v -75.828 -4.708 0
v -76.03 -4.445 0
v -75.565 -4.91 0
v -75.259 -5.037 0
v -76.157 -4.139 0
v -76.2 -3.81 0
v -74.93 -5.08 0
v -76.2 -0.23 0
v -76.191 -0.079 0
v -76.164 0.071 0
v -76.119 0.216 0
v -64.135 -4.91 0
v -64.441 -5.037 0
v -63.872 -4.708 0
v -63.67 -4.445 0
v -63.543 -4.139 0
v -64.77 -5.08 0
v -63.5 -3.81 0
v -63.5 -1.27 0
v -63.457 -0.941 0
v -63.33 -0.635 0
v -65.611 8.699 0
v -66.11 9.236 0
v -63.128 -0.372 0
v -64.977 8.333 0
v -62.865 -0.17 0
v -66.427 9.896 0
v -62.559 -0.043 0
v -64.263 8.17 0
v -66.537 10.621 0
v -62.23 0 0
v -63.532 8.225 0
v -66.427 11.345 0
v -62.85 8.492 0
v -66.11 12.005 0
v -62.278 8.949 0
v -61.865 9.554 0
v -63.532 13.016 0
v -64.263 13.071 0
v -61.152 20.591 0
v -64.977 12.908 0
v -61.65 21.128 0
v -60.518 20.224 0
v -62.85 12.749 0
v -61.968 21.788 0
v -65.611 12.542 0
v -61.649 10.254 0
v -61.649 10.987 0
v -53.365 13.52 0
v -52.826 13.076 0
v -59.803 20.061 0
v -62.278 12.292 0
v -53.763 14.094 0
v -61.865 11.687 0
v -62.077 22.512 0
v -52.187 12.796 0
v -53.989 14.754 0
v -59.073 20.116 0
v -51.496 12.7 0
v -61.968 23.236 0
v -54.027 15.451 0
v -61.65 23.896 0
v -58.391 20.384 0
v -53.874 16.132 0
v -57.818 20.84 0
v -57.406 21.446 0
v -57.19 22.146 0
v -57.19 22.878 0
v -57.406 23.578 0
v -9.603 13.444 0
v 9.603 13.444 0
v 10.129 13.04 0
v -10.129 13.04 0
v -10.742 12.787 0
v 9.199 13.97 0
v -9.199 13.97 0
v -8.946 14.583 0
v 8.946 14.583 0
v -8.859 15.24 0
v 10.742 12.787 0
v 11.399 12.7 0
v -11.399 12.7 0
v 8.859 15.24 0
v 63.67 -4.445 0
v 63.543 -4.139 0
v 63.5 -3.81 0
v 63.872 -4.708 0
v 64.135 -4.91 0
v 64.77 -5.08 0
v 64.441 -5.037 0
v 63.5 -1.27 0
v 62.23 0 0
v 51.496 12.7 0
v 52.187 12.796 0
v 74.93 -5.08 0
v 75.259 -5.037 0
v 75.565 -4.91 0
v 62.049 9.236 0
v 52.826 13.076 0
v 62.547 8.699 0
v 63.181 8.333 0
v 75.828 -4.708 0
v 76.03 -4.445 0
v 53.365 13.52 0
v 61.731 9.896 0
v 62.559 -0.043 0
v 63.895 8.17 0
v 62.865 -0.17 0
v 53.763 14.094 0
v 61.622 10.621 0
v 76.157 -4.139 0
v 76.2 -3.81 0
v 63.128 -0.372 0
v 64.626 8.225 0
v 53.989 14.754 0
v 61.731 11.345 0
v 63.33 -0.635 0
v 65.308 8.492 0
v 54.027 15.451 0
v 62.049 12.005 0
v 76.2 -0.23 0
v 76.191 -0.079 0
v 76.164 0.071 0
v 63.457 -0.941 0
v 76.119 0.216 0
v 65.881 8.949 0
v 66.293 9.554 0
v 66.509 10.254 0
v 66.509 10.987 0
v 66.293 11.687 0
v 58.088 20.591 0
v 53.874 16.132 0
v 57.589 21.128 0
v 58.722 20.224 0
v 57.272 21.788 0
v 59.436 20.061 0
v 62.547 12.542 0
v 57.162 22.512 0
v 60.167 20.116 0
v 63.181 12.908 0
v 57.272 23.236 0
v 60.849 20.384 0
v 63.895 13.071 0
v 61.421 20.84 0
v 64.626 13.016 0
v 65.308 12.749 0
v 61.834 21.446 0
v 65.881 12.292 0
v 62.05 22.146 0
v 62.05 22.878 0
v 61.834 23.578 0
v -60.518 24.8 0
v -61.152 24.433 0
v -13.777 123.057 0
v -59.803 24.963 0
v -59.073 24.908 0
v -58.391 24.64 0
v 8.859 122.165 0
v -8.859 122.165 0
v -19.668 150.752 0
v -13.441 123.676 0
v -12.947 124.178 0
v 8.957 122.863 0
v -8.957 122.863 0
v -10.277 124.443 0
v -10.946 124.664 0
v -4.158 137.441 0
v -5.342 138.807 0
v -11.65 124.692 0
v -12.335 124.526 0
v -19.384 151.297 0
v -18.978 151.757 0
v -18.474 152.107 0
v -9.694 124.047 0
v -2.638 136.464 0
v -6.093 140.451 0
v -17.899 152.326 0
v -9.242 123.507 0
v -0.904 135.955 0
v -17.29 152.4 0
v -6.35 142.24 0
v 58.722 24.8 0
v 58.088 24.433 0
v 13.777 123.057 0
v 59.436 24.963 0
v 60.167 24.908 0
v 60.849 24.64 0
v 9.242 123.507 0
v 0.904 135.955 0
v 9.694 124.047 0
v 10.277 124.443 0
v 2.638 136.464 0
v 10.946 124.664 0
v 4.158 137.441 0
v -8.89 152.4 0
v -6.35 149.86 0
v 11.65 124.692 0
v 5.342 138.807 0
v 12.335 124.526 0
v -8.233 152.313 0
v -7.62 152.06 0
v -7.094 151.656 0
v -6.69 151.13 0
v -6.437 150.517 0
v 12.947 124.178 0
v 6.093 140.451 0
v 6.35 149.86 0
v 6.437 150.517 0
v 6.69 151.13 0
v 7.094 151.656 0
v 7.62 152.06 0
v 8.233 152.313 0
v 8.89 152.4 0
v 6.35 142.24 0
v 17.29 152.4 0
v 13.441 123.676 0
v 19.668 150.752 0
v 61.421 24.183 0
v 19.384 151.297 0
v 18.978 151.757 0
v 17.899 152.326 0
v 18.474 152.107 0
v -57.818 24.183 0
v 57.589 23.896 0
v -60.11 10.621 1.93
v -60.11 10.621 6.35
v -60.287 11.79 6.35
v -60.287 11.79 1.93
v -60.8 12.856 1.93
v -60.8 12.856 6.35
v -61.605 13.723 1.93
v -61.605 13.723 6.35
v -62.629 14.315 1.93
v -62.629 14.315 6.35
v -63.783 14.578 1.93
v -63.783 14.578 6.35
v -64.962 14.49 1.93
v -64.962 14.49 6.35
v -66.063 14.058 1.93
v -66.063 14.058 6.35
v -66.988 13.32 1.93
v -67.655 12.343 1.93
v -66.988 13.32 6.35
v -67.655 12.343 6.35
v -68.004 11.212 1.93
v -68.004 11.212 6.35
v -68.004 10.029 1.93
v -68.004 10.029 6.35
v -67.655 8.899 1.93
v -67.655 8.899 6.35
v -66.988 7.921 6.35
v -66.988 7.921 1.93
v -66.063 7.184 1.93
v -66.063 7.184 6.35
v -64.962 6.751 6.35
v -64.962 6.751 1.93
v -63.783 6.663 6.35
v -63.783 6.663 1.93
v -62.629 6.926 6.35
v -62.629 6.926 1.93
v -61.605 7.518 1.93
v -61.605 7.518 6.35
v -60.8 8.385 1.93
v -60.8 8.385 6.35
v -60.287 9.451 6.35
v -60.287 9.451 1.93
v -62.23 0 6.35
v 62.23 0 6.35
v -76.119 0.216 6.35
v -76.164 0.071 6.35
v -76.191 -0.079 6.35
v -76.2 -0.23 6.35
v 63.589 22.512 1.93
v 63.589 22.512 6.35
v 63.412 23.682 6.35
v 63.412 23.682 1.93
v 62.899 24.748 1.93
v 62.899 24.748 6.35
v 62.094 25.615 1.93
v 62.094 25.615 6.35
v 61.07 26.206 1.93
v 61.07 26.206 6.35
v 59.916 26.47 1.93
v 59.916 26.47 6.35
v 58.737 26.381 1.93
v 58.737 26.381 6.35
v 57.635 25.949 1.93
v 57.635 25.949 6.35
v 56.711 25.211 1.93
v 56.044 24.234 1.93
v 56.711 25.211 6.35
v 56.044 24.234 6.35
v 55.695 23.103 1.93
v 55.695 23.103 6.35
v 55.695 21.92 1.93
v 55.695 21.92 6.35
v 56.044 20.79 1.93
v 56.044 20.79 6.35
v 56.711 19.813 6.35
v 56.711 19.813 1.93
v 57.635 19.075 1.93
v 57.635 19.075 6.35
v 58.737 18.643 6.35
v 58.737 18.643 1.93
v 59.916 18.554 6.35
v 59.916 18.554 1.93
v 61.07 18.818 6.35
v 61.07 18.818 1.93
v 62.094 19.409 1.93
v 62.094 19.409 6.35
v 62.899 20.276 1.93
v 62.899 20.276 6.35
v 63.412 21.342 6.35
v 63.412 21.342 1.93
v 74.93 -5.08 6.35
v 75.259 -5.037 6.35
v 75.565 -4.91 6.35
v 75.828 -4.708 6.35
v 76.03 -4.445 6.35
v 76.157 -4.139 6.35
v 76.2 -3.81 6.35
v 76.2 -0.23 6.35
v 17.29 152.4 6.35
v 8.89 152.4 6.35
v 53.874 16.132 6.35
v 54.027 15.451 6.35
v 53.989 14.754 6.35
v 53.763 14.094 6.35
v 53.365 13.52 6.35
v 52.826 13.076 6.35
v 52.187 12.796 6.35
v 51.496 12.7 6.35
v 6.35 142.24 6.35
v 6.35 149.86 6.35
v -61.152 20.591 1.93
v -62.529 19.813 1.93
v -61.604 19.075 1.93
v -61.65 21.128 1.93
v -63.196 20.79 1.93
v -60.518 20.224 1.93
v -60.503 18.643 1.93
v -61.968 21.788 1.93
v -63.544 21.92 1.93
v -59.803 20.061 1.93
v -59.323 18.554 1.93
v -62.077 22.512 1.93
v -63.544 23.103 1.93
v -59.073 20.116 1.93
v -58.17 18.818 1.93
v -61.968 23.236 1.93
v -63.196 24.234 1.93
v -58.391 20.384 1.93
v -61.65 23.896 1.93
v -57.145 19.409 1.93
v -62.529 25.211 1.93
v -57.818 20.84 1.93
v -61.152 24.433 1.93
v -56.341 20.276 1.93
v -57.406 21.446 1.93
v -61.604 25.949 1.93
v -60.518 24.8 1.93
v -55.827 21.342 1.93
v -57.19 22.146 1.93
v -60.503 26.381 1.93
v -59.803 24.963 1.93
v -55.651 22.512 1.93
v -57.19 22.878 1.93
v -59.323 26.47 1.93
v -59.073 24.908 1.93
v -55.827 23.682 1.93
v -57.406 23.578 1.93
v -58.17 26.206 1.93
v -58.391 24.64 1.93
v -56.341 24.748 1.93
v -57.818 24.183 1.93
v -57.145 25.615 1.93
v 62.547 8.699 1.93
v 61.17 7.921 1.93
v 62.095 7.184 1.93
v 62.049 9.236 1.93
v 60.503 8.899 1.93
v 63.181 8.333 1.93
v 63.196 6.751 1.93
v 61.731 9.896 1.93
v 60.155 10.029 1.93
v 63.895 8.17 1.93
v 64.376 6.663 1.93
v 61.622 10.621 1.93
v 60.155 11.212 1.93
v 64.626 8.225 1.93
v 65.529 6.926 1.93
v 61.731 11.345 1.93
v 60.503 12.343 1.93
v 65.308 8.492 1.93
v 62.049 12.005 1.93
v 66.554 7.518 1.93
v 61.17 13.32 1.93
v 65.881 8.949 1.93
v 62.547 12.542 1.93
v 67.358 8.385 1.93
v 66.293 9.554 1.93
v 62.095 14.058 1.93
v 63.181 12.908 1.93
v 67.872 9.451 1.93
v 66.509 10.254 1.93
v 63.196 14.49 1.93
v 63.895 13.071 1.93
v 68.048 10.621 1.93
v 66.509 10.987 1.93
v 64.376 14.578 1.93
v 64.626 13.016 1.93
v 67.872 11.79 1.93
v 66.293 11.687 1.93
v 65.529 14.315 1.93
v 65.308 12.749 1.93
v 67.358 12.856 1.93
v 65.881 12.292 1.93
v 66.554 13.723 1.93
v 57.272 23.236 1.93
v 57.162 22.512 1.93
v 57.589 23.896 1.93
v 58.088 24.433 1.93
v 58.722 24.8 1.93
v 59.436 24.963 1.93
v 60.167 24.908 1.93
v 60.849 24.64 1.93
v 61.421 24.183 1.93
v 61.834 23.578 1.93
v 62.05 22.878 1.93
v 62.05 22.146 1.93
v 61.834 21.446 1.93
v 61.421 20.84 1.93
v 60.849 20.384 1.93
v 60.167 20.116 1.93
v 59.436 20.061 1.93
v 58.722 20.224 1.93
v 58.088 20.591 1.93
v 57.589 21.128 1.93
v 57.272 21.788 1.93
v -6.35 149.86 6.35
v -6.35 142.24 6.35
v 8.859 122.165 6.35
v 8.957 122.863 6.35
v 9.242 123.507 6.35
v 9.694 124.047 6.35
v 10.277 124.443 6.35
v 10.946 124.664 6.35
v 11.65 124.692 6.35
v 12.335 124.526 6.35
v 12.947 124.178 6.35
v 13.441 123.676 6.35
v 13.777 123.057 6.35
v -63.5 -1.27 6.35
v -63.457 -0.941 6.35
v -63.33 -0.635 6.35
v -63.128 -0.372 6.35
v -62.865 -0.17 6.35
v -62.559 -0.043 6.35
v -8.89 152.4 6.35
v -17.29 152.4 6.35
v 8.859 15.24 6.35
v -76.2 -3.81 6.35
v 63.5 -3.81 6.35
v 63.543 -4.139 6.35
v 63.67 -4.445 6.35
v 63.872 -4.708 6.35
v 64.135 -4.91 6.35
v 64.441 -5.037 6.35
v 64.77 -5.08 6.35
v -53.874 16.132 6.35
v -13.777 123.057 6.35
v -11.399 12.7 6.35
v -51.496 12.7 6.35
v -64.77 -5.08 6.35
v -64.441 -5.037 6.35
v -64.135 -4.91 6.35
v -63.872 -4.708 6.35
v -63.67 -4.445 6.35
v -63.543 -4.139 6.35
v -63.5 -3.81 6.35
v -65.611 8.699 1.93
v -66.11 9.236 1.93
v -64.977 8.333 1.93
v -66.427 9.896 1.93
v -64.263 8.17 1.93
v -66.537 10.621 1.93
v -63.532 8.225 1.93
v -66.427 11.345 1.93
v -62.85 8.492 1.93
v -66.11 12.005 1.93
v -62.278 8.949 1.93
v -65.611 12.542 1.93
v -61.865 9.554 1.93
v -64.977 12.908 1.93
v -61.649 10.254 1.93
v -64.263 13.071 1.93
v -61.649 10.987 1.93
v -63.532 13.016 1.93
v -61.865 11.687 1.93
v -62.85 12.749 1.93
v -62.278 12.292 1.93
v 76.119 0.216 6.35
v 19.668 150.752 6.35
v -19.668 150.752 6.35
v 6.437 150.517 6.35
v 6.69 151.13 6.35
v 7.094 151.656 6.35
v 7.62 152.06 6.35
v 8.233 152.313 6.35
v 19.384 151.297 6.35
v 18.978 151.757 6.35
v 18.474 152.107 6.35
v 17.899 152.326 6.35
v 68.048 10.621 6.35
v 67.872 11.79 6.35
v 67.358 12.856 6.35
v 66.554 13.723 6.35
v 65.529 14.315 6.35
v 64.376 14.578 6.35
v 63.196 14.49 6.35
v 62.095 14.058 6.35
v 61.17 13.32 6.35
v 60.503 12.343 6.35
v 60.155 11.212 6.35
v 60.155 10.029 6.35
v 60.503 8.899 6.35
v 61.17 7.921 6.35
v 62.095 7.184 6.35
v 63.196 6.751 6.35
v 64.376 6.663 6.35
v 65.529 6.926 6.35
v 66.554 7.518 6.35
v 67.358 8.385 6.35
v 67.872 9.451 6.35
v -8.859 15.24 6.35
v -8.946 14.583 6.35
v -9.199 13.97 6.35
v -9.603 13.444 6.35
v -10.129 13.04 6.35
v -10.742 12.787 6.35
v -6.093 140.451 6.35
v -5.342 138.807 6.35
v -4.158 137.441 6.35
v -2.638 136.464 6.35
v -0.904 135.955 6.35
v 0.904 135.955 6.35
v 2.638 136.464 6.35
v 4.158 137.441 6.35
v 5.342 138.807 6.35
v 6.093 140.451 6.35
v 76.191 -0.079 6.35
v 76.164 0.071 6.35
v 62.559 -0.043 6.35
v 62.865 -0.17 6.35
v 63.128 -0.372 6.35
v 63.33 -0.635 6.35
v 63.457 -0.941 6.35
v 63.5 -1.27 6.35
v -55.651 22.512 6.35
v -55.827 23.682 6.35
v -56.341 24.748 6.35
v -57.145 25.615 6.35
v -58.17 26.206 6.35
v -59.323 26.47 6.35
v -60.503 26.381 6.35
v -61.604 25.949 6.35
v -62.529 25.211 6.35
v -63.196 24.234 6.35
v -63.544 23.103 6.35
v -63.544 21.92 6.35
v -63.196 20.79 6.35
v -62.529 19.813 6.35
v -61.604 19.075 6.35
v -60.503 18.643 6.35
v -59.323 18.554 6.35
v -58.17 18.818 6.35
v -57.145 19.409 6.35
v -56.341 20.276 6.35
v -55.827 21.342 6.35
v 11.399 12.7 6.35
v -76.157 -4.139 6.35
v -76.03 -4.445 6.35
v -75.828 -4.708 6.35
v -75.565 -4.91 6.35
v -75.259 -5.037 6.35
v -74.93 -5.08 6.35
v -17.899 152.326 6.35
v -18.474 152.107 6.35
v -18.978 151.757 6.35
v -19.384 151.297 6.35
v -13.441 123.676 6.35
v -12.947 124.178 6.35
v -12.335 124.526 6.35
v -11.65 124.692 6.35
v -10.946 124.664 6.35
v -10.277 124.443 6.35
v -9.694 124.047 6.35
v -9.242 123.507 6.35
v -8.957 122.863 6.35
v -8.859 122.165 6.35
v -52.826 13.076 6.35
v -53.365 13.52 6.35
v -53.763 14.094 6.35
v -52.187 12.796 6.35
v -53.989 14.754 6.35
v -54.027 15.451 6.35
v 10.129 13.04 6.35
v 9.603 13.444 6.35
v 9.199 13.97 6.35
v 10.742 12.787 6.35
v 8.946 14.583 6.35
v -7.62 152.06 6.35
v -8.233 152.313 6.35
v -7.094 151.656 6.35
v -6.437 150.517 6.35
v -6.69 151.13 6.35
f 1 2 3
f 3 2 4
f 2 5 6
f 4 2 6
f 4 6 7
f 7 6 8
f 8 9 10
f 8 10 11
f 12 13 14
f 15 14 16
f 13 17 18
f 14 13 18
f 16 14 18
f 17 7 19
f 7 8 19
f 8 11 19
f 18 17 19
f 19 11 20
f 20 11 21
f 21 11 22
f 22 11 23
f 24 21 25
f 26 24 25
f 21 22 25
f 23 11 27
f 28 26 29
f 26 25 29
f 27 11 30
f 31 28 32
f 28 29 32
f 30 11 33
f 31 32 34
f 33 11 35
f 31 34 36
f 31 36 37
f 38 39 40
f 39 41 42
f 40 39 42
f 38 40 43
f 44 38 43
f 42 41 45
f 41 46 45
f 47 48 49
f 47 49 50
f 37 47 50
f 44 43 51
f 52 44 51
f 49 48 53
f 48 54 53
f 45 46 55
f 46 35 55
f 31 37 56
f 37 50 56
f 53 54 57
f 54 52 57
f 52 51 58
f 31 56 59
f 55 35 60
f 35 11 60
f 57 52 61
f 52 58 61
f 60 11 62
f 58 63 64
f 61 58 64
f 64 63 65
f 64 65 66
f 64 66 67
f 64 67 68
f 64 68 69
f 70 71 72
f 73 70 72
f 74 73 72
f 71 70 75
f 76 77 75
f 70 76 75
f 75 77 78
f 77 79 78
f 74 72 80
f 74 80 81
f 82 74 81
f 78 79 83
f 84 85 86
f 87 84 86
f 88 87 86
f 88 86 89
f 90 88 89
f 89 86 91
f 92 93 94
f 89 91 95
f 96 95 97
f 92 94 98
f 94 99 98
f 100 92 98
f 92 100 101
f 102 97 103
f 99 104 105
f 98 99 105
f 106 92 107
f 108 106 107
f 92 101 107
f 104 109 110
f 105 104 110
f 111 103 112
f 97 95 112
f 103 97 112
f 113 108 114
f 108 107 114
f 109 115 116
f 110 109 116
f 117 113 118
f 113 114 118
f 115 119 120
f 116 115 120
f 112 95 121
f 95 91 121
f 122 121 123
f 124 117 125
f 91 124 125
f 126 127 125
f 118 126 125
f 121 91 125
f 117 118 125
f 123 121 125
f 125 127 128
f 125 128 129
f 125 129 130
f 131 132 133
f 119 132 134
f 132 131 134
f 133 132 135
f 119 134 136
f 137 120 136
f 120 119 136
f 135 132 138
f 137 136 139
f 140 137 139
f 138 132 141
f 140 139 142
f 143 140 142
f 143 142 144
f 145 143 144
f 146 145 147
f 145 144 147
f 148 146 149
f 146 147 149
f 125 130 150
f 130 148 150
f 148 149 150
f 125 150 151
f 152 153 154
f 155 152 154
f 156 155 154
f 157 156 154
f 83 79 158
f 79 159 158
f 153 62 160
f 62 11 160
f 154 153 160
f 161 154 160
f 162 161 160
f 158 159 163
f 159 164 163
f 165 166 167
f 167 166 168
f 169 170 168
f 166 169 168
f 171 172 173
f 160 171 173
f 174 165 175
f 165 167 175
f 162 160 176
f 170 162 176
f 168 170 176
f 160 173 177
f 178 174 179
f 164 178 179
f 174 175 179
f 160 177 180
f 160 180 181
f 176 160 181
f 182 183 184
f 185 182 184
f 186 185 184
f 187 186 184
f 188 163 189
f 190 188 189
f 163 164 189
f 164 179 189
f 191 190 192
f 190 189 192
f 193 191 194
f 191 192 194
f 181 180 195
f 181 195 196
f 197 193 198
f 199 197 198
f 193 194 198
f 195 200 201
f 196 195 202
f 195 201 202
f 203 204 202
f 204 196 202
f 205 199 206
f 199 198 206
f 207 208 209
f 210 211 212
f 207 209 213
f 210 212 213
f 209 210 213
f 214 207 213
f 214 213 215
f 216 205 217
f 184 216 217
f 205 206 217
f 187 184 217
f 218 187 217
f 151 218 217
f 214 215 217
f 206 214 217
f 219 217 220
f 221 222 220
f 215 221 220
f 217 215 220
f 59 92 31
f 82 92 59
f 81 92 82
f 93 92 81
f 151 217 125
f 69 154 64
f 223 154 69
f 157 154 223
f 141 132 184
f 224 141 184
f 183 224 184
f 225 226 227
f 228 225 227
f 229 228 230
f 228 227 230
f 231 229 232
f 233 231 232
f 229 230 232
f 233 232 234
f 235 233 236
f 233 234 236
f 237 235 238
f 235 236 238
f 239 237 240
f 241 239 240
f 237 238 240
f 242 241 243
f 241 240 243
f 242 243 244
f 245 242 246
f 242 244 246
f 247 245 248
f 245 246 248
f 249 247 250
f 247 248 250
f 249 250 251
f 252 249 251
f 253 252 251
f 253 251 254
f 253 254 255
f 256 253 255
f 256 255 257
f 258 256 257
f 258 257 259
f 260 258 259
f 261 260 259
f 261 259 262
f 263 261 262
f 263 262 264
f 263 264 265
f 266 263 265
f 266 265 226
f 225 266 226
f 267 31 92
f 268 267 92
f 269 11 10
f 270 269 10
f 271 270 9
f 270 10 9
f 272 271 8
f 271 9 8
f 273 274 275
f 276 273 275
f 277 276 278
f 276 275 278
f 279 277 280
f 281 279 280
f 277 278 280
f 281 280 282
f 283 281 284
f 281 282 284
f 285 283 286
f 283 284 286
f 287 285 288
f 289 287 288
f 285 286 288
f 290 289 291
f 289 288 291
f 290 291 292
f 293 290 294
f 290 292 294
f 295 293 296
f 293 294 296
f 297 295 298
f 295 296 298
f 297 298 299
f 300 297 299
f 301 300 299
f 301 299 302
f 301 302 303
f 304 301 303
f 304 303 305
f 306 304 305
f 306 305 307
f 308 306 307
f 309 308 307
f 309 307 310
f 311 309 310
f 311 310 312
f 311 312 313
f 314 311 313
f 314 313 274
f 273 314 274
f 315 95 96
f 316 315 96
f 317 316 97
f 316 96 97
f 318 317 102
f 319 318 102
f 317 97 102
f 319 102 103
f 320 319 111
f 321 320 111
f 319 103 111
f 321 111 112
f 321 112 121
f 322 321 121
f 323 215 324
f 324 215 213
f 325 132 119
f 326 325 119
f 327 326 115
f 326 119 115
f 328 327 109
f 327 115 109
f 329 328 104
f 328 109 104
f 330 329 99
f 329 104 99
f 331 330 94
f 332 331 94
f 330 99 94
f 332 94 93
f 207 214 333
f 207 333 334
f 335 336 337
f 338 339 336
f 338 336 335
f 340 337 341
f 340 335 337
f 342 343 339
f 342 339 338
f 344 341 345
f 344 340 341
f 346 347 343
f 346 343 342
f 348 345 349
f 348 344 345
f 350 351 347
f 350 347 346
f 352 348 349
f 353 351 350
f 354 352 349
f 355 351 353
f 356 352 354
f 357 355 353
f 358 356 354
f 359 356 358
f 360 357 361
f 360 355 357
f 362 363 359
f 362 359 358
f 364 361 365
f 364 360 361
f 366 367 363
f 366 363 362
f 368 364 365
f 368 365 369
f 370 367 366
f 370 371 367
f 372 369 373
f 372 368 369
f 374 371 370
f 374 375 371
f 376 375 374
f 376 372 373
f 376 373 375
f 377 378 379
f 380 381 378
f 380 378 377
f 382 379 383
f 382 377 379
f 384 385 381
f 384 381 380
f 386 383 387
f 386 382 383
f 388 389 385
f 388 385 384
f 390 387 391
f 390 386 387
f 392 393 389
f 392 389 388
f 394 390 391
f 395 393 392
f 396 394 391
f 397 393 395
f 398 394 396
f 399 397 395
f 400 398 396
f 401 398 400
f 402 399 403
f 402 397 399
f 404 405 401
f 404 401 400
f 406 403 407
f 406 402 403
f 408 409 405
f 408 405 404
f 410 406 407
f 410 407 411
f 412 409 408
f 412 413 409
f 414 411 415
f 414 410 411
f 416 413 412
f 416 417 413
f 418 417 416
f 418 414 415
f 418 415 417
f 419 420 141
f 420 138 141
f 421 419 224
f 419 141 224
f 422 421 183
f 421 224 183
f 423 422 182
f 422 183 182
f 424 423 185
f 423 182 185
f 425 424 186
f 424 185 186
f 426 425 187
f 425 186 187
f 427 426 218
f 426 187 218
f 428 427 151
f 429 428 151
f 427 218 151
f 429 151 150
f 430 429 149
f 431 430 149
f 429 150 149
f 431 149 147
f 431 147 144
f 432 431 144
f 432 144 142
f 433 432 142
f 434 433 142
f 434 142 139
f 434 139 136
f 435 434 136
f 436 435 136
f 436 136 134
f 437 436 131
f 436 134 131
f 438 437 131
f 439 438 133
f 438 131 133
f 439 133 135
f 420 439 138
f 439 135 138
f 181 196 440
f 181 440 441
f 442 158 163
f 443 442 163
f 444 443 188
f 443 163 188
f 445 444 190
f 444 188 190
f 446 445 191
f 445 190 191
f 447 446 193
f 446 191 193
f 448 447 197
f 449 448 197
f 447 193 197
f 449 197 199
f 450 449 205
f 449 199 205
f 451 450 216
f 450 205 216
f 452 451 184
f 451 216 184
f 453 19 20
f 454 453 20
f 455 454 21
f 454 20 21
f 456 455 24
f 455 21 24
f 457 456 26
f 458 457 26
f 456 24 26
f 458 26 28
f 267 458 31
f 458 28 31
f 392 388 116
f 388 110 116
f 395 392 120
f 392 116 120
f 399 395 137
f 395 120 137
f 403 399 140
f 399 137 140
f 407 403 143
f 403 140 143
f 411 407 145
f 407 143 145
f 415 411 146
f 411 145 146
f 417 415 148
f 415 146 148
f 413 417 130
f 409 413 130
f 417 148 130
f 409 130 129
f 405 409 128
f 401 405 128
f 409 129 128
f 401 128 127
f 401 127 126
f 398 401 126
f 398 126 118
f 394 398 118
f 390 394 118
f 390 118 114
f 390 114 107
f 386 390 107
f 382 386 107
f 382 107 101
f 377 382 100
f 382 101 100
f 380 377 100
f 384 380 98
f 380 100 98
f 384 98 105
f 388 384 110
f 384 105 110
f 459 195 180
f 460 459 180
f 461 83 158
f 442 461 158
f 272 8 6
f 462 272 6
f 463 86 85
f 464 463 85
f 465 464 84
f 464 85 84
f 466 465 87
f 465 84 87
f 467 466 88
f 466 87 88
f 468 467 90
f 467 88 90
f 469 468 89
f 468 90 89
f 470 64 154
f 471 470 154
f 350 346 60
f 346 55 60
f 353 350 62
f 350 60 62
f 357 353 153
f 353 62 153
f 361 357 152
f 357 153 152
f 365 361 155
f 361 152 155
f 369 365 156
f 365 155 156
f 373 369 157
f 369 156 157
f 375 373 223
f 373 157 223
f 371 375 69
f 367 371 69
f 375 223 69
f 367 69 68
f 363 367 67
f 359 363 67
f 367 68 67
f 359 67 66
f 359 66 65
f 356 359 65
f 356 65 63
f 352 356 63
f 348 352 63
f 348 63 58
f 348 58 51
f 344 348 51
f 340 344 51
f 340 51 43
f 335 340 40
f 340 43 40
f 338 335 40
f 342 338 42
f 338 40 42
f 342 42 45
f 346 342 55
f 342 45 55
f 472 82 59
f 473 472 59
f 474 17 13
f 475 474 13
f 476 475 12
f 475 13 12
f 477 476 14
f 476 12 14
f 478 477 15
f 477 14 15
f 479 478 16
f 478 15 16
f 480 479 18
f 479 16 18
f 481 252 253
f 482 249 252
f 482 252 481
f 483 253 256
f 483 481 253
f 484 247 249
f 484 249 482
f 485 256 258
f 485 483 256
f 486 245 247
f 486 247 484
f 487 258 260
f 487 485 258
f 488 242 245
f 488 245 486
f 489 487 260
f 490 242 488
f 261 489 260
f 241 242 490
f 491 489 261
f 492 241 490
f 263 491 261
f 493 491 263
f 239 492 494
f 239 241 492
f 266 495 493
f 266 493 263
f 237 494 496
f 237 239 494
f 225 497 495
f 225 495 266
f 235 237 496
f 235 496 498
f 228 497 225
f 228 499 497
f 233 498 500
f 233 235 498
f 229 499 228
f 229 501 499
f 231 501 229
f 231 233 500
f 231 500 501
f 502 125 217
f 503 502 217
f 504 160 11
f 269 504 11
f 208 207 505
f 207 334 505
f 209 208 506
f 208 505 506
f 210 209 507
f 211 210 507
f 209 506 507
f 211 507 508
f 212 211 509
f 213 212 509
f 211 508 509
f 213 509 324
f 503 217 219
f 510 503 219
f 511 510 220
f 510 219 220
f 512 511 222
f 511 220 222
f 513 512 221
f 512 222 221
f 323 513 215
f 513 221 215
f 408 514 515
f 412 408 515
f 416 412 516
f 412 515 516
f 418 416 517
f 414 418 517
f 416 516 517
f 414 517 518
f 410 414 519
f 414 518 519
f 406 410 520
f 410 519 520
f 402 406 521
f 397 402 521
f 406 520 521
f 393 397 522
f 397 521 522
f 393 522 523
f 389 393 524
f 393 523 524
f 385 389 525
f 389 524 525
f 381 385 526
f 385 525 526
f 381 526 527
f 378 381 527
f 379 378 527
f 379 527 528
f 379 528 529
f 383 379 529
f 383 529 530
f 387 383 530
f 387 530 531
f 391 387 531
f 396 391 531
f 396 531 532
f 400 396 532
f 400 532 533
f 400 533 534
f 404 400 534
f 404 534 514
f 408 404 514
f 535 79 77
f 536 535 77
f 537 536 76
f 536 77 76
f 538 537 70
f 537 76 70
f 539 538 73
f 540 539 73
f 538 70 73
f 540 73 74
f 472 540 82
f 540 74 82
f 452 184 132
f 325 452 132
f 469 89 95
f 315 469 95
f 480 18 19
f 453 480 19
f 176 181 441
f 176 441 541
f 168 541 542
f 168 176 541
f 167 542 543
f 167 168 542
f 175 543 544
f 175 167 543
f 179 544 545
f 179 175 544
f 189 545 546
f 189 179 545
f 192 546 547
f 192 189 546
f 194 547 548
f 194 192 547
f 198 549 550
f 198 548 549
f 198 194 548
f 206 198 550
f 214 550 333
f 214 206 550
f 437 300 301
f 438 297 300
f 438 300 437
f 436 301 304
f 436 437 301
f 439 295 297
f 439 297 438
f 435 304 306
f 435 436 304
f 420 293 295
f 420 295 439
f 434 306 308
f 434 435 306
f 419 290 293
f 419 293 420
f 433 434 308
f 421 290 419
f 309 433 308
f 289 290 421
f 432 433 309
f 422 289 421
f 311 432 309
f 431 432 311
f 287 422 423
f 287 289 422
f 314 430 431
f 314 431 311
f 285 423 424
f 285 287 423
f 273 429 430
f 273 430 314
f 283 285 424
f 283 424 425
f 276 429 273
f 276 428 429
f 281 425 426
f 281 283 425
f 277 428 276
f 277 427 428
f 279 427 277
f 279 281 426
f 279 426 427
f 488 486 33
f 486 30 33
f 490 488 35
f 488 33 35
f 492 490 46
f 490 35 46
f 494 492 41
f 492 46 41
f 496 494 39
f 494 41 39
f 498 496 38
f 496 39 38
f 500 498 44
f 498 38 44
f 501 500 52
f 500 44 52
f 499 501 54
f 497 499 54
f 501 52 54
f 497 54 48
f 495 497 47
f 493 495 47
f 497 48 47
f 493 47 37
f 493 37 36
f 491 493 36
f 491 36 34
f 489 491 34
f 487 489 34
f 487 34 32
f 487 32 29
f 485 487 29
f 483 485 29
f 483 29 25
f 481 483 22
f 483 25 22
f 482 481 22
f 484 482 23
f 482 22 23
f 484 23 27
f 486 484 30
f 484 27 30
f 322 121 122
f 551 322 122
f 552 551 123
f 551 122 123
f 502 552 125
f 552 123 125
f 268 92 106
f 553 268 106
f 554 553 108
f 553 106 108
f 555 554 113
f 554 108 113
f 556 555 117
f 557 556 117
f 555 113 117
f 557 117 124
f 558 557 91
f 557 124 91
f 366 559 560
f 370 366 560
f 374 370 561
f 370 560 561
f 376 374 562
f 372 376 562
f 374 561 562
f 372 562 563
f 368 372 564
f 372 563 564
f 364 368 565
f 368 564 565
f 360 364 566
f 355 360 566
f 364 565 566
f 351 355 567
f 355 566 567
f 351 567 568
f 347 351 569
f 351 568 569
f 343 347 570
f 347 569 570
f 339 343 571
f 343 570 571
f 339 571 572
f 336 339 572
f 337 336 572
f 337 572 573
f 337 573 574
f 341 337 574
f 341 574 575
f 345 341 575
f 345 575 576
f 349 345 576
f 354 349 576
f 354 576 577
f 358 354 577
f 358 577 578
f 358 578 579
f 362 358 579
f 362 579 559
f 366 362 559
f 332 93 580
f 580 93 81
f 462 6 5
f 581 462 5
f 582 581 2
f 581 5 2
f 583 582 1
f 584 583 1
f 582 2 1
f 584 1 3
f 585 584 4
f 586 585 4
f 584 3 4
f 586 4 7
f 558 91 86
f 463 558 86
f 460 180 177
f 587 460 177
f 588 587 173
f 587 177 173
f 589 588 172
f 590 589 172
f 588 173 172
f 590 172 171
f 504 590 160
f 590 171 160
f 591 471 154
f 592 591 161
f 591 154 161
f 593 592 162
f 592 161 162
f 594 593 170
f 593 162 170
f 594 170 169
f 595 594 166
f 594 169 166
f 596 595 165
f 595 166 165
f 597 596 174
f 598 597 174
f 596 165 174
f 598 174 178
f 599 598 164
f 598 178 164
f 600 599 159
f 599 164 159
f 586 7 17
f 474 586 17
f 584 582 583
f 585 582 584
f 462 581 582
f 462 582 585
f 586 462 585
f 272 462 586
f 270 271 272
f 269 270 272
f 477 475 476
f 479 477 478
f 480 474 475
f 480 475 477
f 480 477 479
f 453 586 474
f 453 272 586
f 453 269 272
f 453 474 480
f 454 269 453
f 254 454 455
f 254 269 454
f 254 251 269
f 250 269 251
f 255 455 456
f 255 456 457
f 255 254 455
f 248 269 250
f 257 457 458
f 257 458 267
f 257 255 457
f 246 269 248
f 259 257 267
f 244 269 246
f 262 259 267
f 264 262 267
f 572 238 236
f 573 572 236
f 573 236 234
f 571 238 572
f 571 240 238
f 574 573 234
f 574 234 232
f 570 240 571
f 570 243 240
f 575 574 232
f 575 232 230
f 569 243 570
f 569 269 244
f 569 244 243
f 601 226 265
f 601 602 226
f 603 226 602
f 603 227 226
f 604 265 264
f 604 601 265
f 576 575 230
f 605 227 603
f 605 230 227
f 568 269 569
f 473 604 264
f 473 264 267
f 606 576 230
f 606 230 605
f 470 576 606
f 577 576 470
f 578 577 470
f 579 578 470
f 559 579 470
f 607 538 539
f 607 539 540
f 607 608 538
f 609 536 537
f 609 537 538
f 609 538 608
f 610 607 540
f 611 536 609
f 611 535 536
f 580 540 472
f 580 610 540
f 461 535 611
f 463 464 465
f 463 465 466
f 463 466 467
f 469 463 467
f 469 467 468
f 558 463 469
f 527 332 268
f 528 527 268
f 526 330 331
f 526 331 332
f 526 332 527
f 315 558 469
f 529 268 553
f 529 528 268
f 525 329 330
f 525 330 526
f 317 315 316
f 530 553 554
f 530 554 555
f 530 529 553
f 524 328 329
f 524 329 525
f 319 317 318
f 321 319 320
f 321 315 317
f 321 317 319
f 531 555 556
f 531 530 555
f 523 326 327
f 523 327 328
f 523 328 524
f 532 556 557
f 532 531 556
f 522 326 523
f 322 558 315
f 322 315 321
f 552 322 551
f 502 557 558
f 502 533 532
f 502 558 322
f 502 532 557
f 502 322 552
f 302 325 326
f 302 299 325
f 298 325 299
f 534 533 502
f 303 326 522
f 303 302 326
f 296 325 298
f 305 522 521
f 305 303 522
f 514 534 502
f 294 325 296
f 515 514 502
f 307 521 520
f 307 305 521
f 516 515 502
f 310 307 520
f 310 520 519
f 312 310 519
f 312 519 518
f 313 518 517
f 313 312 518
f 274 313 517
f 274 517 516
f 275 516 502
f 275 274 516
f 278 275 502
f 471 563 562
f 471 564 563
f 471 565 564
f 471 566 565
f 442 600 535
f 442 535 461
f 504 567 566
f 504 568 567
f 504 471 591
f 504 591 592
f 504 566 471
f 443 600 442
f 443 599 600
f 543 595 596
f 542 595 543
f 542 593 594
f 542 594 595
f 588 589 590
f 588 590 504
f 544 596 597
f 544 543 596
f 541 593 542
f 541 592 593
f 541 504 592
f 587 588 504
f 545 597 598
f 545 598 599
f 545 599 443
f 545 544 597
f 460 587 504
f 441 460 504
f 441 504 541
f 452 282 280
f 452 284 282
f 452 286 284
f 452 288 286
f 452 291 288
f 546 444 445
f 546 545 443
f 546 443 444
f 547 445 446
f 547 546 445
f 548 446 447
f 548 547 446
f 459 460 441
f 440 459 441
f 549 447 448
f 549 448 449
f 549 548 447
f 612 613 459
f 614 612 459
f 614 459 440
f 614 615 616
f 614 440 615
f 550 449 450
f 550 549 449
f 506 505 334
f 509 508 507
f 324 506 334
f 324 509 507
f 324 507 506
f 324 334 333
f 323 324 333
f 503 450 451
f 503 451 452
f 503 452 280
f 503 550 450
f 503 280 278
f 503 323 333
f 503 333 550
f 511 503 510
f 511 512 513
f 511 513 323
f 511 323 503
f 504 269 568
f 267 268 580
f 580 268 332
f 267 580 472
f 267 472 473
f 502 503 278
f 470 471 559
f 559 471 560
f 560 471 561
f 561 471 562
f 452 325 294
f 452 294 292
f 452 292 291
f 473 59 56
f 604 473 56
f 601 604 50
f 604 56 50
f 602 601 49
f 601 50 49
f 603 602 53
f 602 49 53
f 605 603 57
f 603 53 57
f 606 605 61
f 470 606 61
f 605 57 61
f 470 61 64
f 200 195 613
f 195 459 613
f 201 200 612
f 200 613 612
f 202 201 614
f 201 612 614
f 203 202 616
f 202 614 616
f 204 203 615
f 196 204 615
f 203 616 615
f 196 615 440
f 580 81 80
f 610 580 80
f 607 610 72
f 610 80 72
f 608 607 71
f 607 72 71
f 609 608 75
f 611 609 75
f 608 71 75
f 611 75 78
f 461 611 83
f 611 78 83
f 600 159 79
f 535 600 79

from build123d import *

# Parameters (mm, degrees)
BOSS_EXTRUDE1_DEPTH                            = 6.35
CUT_EXTRUDE1_DEPTH                             = 7.35
CUT_EXTRUDE2_DEPTH                             = 7.35
FILLET1_R                                      = 2.54
CBORE_FOR_8_SOCKET_HEAD_CAP_SCREW1_D           = 4.9149
CBORE_FOR_8_SOCKET_HEAD_CAP_SCREW1_CBORE_D     = 7.9375
CBORE_FOR_8_SOCKET_HEAD_CAP_SCREW1_CBORE_DEPTH = 4.4196


with BuildPart() as part:
    # Sketch1 → Boss-Extrude1 (new body)
    with BuildSketch(Plane.XY):
        with BuildLine():
            Line((-19.668054922, 150.751853542), (-76.119138056, 0.215631852))
            ThreePointArc((-76.119138056, 0.215631852), (-76.179621009, -0.003695416), (-76.2, -0.230294919))
            Line((-76.2, -0.230294919), (-76.2, -3.81))
            ThreePointArc((-76.2, -3.81), (-75.828025612, -4.708025612), (-74.93, -5.08))
            Line((-74.93, -5.08), (-64.77, -5.08))
            ThreePointArc((-64.77, -5.08), (-63.871974388, -4.708025612), (-63.5, -3.81))
            Line((-63.5, -3.81), (-63.5, -1.27))
            ThreePointArc((-63.5, -1.27), (-63.128025612, -0.371974388), (-62.23, 0))
            Line((-62.23, 0), (62.23, 0))
            ThreePointArc((62.23, 0), (63.128025612, -0.371974388), (63.5, -1.27))
            Line((63.5, -1.27), (63.5, -3.81))
            ThreePointArc((63.5, -3.81), (63.871974388, -4.708025612), (64.77, -5.08))
            Line((64.77, -5.08), (74.93, -5.08))
            ThreePointArc((74.93, -5.08), (75.828025612, -4.708025612), (76.2, -3.81))
            Line((76.2, -3.81), (76.2, -0.230294919))
            ThreePointArc((76.2, -0.230294919), (76.179621009, -0.003695416), (76.119138056, 0.215631852))
            Line((76.119138056, 0.215631852), (19.668054922, 150.751853542))
            ThreePointArc((19.668054922, 150.751853542), (18.736549699, 151.947691069), (17.289778811, 152.4))
            Line((17.289778811, 152.4), (-17.289778811, 152.4))
            ThreePointArc((-17.289778811, 152.4), (-18.736549699, 151.947691069), (-19.668054922, 150.751853542))
        make_face()
    extrude(amount=BOSS_EXTRUDE1_DEPTH)

    # Sketch2 → Cut-Extrude1 (cut, through all)
    with BuildSketch(Plane(origin=(0, 0, 0), x_dir=(-1, 0, 0), z_dir=(0, 0, -1))):
        with BuildLine():
            Line((-8.859145886, 15.24), (-8.859145886, 122.164815439))
            ThreePointArc((-8.859145886, 122.164815439), (-10.94594688, 124.664057457), (-13.777421997, 123.056668981))
            Line((-13.777421997, 123.056668981), (-53.874227787, 16.131853542))
            ThreePointArc((-53.874227787, 16.131853542), (-53.583642745, 13.793229112), (-51.495951676, 12.7))
            Line((-51.495951676, 12.7), (-11.399145886, 12.7))
            ThreePointArc((-11.399145886, 12.7), (-9.603094662, 13.443948776), (-8.859145886, 15.24))
        make_face()
        with BuildLine():
            Line((53.874227787, 16.131853542), (13.777421997, 123.056668981))
            ThreePointArc((13.777421997, 123.056668981), (10.94594688, 124.664057457), (8.859145886, 122.164815439))
            Line((8.859145886, 122.164815439), (8.859145886, 15.24))
            ThreePointArc((8.859145886, 15.24), (9.603094662, 13.443948776), (11.399145886, 12.7))
            Line((11.399145886, 12.7), (51.495951676, 12.7))
            ThreePointArc((51.495951676, 12.7), (53.583642745, 13.793229112), (53.874227787, 16.131853542))
        make_face()
    extrude(amount=-CUT_EXTRUDE1_DEPTH, mode=Mode.SUBTRACT)

    # Sketch3 → Cut-Extrude2 (cut, through all)
    with BuildSketch(Plane(origin=(0, 0, 0), x_dir=(-1, 0, 0), z_dir=(0, 0, -1))):
        with BuildLine():
            Line((-6.35, 142.24), (-6.35, 152.4))
            Line((-6.35, 152.4), (6.35, 152.4))
            Line((6.35, 152.4), (6.35, 142.24))
            ThreePointArc((6.35, 142.24), (0, 135.89), (-6.35, 142.24))
        make_face()
    extrude(amount=-CUT_EXTRUDE2_DEPTH, mode=Mode.SUBTRACT)

    # Fillet1
    fillet1_edges = [part.edges().sort_by_distance(p)[0] for p in [
        (6.35, 152.4, 3.175),
        (-6.35, 152.4, 3.175),
    ]]
    fillet(fillet1_edges, radius=FILLET1_R)

    # CBORE for #8 Socket Head Cap Screw1 (through all)
    with Locations(Plane.XY.offset(6.35)):
        with Locations((-59.619847535, 22.511970393), (-64.079115243, 10.620589838), (59.619847535, 22.511970393), (64.079115243, 10.620589838)):
            CounterBoreHole(CBORE_FOR_8_SOCKET_HEAD_CAP_SCREW1_D / 2, CBORE_FOR_8_SOCKET_HEAD_CAP_SCREW1_CBORE_D / 2, CBORE_FOR_8_SOCKET_HEAD_CAP_SCREW1_CBORE_DEPTH)


solid = part.part
